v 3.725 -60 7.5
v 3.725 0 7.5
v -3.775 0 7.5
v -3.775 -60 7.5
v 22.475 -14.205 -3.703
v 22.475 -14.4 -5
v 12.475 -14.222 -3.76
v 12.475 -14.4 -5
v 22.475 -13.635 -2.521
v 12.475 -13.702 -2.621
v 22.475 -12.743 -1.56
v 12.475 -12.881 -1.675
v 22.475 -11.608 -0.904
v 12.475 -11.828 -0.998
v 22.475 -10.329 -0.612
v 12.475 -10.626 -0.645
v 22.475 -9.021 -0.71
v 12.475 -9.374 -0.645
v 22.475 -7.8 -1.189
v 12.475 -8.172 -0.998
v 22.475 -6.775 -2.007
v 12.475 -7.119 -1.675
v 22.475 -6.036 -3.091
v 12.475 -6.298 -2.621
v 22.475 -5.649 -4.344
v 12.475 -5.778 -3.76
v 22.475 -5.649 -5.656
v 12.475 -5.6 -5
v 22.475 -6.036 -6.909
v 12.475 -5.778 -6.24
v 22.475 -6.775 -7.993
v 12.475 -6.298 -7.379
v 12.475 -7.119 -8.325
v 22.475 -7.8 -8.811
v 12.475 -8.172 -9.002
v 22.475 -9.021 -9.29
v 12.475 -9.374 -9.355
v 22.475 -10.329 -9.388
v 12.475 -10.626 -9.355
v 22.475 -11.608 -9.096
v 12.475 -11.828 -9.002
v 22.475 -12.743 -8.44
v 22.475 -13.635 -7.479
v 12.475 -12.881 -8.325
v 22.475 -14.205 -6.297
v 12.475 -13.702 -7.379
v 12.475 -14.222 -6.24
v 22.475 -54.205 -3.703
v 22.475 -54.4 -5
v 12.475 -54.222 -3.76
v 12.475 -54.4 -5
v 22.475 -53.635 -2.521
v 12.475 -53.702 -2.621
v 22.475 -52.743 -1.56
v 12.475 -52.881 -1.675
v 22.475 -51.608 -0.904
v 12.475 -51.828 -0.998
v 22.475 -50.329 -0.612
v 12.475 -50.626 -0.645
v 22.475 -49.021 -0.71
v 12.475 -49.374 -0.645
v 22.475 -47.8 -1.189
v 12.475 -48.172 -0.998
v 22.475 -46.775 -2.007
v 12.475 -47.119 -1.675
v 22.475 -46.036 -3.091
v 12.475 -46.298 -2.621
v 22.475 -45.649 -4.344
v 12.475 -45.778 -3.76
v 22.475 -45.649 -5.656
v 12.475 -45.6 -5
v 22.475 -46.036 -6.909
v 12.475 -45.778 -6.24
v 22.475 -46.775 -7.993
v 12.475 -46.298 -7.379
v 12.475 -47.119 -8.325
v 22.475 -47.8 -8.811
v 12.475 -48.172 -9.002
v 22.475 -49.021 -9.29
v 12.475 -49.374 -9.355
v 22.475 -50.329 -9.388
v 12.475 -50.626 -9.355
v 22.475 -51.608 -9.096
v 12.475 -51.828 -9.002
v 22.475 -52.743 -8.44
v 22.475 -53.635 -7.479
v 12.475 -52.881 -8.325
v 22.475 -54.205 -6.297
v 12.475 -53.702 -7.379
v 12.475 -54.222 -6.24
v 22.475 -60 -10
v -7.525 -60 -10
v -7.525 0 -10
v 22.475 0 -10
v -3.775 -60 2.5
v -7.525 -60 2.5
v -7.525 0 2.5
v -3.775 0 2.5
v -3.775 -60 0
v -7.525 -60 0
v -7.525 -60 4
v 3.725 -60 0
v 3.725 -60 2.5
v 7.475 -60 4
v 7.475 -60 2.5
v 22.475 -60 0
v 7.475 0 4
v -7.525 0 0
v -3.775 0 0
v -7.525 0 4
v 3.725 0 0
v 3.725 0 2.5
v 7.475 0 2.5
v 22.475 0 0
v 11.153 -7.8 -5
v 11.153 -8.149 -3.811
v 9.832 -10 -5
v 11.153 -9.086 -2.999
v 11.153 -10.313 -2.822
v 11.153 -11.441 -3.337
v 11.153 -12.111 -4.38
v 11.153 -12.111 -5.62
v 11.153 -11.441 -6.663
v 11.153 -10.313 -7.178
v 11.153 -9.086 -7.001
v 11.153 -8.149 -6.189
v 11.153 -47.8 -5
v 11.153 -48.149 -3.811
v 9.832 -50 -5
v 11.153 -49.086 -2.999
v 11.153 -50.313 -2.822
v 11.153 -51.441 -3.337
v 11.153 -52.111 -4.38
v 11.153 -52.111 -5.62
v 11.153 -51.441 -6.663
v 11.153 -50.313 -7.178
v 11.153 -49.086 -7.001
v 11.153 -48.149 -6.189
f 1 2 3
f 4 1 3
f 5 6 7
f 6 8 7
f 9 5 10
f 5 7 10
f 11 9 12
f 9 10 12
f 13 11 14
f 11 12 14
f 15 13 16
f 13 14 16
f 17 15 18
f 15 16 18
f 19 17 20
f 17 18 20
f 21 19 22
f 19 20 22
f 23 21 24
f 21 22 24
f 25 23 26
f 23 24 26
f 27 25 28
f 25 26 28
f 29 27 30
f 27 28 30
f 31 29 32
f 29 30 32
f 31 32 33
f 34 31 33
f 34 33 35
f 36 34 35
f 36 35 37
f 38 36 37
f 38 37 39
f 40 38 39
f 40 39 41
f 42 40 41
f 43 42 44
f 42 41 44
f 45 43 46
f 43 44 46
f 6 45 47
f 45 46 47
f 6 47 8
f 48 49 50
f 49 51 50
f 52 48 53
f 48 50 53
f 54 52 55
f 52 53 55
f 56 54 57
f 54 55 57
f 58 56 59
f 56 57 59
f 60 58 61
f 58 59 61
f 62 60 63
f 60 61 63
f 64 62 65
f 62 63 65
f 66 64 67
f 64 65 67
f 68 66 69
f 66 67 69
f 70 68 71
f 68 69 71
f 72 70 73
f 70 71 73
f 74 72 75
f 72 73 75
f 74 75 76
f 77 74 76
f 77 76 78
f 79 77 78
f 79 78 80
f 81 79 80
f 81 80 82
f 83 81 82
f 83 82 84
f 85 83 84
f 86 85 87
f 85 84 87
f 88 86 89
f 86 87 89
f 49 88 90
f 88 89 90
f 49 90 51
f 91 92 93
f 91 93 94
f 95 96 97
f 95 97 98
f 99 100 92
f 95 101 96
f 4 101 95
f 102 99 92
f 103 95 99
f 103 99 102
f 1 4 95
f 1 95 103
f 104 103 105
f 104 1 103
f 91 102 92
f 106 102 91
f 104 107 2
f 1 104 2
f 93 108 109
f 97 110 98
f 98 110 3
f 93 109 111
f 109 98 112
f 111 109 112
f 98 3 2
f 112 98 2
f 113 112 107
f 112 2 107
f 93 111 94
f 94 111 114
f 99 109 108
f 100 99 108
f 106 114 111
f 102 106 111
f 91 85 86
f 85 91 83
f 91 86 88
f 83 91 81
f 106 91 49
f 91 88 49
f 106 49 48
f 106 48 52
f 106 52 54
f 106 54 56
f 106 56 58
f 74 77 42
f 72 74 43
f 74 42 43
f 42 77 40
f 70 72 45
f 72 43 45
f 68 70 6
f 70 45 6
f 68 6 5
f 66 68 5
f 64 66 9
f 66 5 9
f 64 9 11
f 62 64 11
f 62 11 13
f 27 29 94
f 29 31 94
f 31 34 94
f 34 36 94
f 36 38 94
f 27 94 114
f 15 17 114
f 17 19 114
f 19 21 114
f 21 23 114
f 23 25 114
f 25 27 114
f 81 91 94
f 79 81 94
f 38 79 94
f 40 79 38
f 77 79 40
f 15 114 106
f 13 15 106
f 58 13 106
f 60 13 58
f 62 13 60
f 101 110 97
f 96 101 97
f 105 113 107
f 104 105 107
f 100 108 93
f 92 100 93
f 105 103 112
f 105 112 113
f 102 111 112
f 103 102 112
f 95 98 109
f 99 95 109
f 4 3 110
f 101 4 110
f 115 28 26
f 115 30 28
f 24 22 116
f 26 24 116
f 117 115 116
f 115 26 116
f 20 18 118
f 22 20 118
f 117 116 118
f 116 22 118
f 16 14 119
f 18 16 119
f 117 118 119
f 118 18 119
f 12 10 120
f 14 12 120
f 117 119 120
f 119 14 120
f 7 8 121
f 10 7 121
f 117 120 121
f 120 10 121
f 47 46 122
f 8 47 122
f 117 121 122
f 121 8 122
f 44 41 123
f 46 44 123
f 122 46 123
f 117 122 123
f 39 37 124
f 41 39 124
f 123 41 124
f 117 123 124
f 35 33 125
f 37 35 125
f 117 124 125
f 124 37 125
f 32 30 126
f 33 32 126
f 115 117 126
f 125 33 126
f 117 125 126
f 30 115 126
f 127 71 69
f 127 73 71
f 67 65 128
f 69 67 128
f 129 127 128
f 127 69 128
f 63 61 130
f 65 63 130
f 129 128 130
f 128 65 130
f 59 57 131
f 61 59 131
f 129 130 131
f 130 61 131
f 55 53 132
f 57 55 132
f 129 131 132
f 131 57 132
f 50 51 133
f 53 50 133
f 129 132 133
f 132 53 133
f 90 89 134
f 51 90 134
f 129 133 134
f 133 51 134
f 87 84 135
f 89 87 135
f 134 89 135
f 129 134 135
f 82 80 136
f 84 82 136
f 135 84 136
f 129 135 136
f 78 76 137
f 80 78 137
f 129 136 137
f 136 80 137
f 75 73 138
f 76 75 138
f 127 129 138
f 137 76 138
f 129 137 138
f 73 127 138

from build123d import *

# Parameters (mm, degrees)
F1_DEPTH = 60
F3_D     = 8.8
F3_DEPTH = 10
F3_TIP   = 2.6437867237


with BuildPart() as f1:
    # F0 (on Front) → F1 (new body)
    with BuildSketch(Plane.XZ):
        Polygon((-3.7746716016, 2.5), (-3.7746716016, 0), (3.7253283984, 0), (3.7253283984, 2.5), (7.4753283984, 2.5), (7.4753283984, 4), (3.7253283984, 7.5), (-3.7746716016, 7.5), (-7.5246716016, 4), (-7.5246716016, 2.5), align=None)
        Polygon((3.7253283984, 0), (-3.7746716016, 0), (-7.5246716016, 0), (-7.5246716016, -10), (22.4753283984, -10), (22.4753283984, 0), align=None)
    extrude(amount=F1_DEPTH)

    # F3
    with Locations(Plane.YZ.offset(22.4753283984)):
        with Locations((-50, -5), (-10, -5)):
            Hole(F3_D / 2, depth=F3_DEPTH)
            with Locations((0, 0, -(F3_DEPTH + F3_TIP / 2))):  # 118° drill point
                Cone(0, F3_D / 2, F3_TIP, mode=Mode.SUBTRACT)


solid = f1.part
